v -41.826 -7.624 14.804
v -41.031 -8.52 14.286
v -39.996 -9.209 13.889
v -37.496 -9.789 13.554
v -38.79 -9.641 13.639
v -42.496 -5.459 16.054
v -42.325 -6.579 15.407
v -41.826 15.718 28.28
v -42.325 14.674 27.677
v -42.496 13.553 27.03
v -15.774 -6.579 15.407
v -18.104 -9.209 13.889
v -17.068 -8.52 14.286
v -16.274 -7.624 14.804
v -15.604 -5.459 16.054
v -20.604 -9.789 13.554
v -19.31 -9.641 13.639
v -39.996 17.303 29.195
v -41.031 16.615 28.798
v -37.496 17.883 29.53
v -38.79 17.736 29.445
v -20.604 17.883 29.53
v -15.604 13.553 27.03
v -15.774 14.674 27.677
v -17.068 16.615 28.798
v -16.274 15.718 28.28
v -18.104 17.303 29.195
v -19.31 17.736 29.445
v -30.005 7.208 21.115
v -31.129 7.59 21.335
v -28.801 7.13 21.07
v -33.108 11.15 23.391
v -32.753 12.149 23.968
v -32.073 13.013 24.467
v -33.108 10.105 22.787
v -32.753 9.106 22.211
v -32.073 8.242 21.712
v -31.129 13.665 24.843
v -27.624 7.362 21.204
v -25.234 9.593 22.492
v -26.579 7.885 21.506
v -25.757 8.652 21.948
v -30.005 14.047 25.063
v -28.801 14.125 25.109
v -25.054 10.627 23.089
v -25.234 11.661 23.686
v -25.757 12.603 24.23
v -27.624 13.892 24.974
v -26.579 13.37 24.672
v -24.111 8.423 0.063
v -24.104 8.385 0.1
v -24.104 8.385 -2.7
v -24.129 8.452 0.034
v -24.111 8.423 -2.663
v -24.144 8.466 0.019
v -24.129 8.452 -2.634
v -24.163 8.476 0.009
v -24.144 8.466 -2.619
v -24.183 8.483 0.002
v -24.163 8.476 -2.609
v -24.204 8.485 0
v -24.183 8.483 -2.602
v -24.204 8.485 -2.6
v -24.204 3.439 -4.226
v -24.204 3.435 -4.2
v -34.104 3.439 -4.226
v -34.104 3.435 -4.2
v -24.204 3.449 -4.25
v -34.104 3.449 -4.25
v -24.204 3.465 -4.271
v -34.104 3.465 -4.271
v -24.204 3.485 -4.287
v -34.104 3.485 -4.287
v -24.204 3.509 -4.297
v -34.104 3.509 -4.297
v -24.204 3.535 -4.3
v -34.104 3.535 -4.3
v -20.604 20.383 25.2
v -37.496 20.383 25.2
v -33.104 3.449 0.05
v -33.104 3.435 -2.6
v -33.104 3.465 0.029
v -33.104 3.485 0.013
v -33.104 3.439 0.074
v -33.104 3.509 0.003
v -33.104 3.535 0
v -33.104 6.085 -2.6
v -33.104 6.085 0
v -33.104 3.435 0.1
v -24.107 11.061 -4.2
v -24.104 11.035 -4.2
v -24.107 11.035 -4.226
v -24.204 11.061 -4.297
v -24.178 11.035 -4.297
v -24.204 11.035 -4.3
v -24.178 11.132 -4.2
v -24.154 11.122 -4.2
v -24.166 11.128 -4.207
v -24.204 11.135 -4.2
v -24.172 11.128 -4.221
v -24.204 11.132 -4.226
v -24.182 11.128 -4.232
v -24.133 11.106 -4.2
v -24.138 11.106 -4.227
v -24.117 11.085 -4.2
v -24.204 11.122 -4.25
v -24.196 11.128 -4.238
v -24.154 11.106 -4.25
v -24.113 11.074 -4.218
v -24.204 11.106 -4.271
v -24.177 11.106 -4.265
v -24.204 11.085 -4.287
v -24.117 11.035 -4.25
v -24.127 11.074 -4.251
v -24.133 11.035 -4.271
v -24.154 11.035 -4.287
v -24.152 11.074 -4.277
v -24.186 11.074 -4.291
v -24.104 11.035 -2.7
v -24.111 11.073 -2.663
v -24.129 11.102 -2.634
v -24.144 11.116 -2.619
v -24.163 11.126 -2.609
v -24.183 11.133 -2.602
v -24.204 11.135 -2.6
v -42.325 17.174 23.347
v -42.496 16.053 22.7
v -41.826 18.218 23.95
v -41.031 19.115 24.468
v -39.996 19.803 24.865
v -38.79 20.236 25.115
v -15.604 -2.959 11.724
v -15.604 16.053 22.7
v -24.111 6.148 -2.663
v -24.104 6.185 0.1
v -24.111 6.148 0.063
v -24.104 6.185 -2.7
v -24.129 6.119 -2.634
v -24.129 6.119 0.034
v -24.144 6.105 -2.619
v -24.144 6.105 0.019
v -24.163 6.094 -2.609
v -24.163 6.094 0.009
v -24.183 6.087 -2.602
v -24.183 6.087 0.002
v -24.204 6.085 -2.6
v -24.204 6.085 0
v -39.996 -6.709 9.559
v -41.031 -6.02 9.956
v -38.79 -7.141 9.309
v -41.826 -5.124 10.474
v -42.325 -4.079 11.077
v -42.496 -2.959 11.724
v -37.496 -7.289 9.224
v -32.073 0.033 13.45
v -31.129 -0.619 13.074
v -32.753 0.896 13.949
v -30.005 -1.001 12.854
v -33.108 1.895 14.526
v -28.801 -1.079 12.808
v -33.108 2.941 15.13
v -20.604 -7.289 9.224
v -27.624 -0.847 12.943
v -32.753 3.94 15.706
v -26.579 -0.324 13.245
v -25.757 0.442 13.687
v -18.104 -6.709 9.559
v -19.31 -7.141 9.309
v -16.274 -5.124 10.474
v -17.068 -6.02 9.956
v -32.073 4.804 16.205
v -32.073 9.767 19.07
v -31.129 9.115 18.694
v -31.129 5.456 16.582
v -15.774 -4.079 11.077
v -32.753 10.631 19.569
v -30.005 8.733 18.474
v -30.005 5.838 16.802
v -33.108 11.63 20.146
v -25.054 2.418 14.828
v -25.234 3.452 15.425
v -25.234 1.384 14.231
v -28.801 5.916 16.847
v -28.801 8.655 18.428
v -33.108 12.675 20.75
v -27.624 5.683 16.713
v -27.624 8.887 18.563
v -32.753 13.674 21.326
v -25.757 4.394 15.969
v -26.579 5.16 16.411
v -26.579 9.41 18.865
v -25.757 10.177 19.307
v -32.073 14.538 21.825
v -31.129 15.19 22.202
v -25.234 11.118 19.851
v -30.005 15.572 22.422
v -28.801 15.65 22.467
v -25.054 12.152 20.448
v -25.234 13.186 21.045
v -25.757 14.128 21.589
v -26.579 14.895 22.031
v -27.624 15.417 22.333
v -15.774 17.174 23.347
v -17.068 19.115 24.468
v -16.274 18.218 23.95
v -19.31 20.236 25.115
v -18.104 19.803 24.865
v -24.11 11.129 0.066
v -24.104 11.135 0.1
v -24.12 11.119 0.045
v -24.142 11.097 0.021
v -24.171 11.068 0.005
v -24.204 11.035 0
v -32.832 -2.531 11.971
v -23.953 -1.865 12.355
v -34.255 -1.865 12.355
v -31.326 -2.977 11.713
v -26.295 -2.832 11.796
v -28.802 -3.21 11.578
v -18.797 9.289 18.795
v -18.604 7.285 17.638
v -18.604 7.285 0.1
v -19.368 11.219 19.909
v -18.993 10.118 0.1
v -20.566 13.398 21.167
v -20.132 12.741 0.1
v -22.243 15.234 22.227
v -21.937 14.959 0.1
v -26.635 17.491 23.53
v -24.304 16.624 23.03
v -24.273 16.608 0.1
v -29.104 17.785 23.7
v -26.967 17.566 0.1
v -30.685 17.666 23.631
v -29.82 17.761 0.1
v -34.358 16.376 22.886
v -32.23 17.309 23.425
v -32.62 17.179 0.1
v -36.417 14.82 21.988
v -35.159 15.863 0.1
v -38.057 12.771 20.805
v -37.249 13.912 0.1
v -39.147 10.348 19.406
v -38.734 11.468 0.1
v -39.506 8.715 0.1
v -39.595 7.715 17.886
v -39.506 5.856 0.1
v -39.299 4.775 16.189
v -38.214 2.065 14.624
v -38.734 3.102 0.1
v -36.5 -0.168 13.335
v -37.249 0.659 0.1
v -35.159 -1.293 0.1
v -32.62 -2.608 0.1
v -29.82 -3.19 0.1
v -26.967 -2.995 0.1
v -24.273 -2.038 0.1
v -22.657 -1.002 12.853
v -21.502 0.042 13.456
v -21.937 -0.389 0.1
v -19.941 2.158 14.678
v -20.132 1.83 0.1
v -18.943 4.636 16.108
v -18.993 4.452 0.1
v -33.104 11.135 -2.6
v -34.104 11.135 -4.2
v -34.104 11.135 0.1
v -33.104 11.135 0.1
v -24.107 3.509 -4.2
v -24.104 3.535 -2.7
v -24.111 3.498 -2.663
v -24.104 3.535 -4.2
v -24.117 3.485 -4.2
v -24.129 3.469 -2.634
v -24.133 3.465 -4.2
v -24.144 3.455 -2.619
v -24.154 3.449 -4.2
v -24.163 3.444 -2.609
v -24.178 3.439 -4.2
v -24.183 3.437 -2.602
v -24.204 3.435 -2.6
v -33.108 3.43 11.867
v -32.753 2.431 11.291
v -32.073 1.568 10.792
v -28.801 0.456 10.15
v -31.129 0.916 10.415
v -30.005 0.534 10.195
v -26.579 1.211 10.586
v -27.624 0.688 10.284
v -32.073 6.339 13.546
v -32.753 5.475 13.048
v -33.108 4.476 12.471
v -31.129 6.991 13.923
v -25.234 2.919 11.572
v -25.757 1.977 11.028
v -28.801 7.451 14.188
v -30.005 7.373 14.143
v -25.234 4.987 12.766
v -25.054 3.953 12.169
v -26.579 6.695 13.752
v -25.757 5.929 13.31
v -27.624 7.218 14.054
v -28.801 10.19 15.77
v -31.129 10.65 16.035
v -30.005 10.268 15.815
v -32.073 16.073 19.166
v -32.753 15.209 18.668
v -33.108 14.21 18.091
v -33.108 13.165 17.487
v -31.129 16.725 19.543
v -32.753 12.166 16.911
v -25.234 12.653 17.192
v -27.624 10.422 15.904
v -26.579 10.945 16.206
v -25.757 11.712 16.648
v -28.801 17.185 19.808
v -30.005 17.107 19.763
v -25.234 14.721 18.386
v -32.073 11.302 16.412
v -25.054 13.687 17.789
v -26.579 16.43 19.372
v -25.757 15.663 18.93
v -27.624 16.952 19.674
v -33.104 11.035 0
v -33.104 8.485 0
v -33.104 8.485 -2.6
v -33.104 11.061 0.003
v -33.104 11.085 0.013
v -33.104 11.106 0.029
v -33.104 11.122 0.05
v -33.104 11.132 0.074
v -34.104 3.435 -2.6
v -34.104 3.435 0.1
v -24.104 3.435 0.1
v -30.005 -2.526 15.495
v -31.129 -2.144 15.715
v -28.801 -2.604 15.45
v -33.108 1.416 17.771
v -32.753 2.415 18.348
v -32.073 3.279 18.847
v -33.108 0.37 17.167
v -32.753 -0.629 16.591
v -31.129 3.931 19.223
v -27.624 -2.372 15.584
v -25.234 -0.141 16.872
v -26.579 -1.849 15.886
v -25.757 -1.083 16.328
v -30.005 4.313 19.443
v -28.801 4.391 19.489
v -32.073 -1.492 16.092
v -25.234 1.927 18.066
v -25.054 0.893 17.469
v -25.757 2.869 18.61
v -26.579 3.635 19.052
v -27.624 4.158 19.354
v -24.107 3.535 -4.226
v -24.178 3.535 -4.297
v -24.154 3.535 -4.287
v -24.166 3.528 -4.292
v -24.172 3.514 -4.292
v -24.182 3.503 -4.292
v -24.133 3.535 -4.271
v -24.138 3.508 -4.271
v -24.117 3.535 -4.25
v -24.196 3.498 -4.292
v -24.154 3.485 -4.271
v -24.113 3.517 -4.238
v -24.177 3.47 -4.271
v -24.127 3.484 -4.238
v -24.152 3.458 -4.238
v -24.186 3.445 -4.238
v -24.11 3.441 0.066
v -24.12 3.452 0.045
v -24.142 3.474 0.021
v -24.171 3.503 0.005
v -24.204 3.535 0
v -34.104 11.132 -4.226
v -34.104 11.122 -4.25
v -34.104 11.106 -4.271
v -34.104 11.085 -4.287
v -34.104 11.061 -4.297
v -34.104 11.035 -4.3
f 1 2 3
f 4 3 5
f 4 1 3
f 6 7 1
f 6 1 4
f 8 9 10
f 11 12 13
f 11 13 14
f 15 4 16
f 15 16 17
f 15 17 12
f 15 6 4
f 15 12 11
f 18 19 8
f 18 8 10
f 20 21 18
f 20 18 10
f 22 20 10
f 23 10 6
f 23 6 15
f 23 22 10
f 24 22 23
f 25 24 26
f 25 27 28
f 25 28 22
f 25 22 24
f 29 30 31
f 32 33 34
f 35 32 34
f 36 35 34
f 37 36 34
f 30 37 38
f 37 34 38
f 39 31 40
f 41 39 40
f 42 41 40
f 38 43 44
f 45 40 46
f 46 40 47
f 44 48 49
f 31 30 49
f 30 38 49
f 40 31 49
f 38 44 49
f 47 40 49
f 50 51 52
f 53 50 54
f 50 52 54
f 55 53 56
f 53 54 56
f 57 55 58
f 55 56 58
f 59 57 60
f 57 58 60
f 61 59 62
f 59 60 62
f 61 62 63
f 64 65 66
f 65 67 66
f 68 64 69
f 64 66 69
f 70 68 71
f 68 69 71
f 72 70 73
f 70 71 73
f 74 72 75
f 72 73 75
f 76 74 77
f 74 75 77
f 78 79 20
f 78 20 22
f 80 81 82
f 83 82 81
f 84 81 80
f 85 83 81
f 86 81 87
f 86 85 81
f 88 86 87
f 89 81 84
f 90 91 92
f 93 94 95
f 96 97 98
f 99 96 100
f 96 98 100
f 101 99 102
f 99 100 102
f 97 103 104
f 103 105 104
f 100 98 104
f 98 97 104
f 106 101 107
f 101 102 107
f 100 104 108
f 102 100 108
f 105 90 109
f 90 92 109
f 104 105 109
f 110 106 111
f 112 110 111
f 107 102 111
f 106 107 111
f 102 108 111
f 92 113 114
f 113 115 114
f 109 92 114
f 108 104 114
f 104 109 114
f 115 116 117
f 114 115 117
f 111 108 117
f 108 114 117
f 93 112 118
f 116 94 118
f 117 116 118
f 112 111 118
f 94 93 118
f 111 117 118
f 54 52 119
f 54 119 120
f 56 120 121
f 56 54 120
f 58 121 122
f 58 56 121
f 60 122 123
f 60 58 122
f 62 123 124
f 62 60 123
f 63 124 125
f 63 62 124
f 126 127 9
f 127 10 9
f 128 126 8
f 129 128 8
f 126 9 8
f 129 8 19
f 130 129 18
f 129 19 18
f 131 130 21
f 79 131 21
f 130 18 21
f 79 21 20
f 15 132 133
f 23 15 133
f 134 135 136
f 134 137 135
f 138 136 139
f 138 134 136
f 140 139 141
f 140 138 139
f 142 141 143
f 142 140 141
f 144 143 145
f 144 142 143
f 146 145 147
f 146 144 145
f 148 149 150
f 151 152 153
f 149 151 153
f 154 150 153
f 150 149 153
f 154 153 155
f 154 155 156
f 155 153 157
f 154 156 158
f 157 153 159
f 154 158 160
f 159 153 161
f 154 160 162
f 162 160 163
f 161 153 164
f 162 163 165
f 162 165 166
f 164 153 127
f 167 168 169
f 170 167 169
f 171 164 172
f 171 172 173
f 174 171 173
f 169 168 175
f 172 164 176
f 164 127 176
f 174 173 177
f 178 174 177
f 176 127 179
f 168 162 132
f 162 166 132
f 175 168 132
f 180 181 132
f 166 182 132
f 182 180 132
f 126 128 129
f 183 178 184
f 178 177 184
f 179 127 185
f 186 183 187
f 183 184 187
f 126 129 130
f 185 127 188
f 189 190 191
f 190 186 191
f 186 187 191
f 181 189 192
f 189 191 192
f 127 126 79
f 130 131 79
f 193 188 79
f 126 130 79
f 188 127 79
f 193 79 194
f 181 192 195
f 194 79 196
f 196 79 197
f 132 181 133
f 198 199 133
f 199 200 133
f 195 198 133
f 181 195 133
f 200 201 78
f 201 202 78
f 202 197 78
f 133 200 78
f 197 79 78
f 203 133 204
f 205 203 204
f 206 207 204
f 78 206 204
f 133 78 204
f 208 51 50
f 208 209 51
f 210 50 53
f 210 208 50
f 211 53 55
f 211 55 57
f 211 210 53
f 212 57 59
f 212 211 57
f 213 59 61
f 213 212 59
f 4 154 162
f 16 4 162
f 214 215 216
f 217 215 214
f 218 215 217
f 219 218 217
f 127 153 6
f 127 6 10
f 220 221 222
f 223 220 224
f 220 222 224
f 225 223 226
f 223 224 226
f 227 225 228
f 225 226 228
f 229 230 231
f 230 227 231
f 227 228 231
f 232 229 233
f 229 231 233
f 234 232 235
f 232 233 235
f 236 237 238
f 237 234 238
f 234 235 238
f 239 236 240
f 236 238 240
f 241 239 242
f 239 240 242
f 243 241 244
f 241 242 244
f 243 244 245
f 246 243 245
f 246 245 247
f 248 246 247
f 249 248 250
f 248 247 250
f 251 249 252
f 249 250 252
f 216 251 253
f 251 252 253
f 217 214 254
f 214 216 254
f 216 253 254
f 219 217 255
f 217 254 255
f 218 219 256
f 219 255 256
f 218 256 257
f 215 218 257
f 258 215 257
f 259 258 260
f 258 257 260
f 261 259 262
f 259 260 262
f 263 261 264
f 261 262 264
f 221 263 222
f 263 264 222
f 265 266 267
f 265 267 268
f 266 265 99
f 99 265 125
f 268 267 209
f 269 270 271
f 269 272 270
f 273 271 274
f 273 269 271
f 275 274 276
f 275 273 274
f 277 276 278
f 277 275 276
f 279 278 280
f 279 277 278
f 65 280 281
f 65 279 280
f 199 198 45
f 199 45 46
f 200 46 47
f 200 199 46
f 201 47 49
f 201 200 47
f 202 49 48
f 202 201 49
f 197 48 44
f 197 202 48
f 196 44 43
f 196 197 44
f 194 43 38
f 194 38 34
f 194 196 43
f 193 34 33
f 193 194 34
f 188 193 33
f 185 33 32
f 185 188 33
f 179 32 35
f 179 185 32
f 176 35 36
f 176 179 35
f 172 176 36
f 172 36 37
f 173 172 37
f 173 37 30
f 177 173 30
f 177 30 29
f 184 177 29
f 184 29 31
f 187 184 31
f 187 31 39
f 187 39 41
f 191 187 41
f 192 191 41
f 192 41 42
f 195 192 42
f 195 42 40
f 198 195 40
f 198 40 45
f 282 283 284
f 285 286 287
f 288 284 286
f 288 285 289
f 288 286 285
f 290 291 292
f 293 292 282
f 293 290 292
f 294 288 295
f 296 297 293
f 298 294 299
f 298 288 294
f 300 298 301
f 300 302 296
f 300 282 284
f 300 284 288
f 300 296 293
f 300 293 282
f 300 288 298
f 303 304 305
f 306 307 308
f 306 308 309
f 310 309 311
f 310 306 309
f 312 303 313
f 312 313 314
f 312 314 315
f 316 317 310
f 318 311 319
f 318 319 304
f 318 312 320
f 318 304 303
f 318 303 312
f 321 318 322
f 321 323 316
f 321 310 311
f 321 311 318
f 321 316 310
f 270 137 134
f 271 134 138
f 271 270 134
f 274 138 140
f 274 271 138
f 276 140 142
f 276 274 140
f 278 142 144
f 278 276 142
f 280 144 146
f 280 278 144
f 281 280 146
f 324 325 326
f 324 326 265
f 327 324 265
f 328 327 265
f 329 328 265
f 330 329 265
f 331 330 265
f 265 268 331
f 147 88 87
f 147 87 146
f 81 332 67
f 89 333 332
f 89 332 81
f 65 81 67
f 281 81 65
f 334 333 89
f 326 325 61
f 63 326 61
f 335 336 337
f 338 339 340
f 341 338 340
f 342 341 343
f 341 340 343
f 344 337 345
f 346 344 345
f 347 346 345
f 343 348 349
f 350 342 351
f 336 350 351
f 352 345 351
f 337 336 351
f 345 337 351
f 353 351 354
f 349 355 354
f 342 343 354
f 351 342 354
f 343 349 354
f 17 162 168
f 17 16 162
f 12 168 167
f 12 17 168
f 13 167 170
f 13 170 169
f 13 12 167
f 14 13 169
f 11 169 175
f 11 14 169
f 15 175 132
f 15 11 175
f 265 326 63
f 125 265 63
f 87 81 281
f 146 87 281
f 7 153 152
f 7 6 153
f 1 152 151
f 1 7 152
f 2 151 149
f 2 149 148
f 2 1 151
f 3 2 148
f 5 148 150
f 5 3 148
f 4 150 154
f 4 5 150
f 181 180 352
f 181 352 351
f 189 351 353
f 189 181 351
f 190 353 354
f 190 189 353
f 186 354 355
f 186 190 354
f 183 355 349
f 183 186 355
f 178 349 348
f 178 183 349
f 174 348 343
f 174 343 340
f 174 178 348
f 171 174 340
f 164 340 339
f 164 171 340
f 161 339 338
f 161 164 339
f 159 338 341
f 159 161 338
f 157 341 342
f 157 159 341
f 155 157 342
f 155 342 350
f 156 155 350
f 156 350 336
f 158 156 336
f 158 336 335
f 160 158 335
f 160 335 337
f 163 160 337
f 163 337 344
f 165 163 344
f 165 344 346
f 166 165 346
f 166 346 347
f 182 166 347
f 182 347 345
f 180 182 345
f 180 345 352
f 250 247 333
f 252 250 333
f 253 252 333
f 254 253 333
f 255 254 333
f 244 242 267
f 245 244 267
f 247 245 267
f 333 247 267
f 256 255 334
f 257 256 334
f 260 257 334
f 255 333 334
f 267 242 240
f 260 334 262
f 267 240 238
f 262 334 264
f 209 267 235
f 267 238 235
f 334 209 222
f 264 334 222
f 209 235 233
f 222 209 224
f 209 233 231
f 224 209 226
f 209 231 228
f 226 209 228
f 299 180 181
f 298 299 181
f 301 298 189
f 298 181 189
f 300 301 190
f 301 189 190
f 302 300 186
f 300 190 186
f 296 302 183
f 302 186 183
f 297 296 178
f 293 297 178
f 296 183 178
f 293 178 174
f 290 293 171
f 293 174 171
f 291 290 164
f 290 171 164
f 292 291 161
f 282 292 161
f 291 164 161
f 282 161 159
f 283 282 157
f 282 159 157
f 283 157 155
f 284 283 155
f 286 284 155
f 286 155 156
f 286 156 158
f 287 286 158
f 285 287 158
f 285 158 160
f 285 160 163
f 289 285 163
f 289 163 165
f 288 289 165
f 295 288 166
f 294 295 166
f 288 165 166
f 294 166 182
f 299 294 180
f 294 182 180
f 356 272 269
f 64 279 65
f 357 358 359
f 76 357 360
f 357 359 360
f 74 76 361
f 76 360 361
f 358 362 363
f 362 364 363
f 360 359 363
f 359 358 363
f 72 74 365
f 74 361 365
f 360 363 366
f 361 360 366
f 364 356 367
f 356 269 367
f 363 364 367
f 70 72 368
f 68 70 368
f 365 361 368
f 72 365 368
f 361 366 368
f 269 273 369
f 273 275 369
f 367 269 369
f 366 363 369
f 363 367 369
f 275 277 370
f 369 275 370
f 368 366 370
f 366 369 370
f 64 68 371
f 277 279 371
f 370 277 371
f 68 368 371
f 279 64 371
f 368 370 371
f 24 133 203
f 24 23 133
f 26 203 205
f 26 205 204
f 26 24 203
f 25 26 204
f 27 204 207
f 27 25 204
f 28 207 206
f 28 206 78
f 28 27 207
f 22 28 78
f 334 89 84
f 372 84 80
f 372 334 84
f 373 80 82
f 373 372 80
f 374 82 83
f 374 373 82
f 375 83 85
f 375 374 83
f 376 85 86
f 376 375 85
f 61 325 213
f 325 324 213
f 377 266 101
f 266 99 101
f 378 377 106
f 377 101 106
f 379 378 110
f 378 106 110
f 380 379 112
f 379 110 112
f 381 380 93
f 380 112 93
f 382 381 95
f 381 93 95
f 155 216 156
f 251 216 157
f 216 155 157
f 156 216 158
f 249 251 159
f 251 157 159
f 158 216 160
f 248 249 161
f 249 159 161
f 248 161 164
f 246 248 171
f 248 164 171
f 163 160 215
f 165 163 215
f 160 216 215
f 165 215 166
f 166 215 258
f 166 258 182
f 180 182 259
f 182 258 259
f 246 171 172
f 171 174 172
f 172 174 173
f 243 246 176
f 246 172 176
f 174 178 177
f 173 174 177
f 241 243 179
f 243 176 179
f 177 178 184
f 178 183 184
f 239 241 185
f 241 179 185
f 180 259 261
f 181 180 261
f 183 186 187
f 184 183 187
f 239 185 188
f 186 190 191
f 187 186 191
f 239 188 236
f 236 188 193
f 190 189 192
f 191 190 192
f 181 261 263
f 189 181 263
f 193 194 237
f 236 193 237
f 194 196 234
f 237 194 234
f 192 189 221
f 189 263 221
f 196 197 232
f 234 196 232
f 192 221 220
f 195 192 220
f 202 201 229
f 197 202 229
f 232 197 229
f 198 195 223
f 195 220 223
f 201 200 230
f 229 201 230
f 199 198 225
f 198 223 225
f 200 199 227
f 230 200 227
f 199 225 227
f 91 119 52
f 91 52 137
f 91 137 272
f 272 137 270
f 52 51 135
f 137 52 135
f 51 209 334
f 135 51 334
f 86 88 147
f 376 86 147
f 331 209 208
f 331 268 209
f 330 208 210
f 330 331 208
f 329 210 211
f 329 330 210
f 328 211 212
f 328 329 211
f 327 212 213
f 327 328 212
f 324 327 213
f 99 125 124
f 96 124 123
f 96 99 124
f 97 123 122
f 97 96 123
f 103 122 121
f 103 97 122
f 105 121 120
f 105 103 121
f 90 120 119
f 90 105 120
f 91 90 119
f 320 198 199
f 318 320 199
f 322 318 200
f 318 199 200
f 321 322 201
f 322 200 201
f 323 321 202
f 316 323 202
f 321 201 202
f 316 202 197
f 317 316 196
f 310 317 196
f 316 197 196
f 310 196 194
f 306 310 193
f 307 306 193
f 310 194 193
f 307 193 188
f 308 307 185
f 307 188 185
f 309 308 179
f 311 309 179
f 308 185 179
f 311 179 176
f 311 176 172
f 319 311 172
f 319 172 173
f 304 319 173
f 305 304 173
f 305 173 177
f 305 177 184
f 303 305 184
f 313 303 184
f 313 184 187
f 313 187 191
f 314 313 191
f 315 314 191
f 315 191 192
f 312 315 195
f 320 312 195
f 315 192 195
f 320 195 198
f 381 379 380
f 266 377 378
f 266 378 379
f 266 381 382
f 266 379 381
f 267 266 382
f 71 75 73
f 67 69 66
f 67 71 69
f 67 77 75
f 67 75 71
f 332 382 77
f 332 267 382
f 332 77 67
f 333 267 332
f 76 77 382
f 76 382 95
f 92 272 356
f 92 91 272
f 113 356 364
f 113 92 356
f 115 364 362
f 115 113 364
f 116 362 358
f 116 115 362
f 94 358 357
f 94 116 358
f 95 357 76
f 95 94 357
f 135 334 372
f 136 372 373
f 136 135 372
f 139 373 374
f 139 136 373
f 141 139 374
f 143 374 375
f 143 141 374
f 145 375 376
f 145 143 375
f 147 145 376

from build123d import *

# Parameters (mm, degrees)
F0_W           = 1
F0_H           = 2.65
F0_H_2         = 2.4
F0_W_2         = 9
F1_DEPTH       = 1.7
F2_DEPTH       = 4.3
F3_START       = 2.6
F3_DEPTH       = 1.7
F4_DEPTH       = 2.6
F5_START       = 0.1
F0_R           = 10.5
F5_DEPTH       = 1.6
F6_R           = 0.09999
F7_R           = 10.5
F8_DEPTH       = 22
F10_DEPTH      = 39.6047188237
F10_DEPTH_BACK = 25
F11_R          = 4.05
F12_DEPTH      = 3.07
F13_W          = 26.8920833189
F13_H          = 31.9528504953
F14_DEPTH      = 5
F13_R          = 4.05
F15_DEPTH      = 3.05
F16_START      = 3.05
F16_DEPTH      = 1.95
F17_R          = 5


# Not quite as in the source:
# - a fillet or chamfer is up to 0.001 mm smaller than in the source, because OpenCascade refuses the exact size


with BuildPart() as f1:
    # F0 (on Top) → F1 (new body)
    with BuildSketch(Plane.XY):
        with Locations((-33.6037188237, 9.8102559388)):
            Rectangle(F0_W, F0_H)
        with Locations((-33.6037188237, 7.2852559388)):
            Rectangle(F0_W, F0_H_2)
        with Locations((-28.6037188237, 9.8102559388)):
            Rectangle(F0_W_2, F0_H)
        with Locations((-28.6037188237, 7.2852559388)):
            Rectangle(F0_W_2, F0_H_2)
        with Locations((-28.6037188237, 4.7602559388)):
            Rectangle(F0_W_2, F0_H)
        with Locations((-33.6037188237, 4.7602559388)):
            Rectangle(F0_W, F0_H)
    extrude(amount=F1_DEPTH)

    # F0 (on Top) → F2 (join)
    with BuildSketch(Plane.XY):
        with Locations((-28.6037188237, 7.2852559388)):
            Rectangle(F0_W_2, F0_H_2)
    extrude(amount=-F2_DEPTH)

    # F1_face (on face) → F3 (join)
    with BuildSketch(Plane(origin=(-29.298664672, 7.2852559388, 0), x_dir=(1, 0, 0), z_dir=(0, 0, -1)).offset(F3_START)):
        Polygon((-4.8050541516, -3.85), (5.1949458484, -3.85), (5.1949458484, -1.2), (-3.8050541516, -1.2), (-3.8050541516, 1.2), (5.1949458484, 1.2), (5.1949458484, 3.85), (-4.8050541516, 3.85), align=None)
    extrude(amount=F3_DEPTH)

    # F0 (on Top) → F4 (join, through all)
    with BuildSketch(Plane.XY):
        with Locations((-33.6037188237, 9.8102559388)):
            Rectangle(F0_W, F0_H)
        with Locations((-33.6037188237, 7.2852559388)):
            Rectangle(F0_W, F0_H_2)
        with Locations((-33.6037188237, 4.7602559388)):
            Rectangle(F0_W, F0_H)
    extrude(amount=-F4_DEPTH)

    # F0 (on Top) → F5 (join)
    with BuildSketch(Plane.XY.offset(F5_START)):
        with Locations((-29.1037188237, 7.2852559388)):
            Circle(F0_R)
        Polygon((-34.1037188237, 8.4852559388), (-34.1037188237, 11.1352559388), (-33.1037188237, 11.1352559388), (-24.1037188237, 11.1352559388), (-24.1037188237, 8.4852559388), (-24.1037188237, 6.0852559388), (-24.1037188237, 3.4352559388), (-33.1037188237, 3.4352559388), (-34.1037188237, 3.4352559388), (-34.1037188237, 6.0852559388), align=None, mode=Mode.SUBTRACT)
    extrude(amount=F5_DEPTH)

    # F6 (radius 0.1 in the source; OpenCascade refuses exactly that, so slightly less here)
    f6_edges = [f1.edges().sort_by_distance(p)[0] for p in [
        (-24.103719, 4.760256, 0),
        (-24.103719, 9.810256, 0),
        (-24.103719, 6.085256, -1.3),
        (-24.103719, 8.485256, -1.3),
        (-24.103719, 9.810256, -2.6),
        (-24.103719, 4.760256, -2.6),
        (-24.103719, 3.435256, -3.45),
        (-24.103719, 7.285256, -4.3),
        (-24.103719, 11.135256, -3.45),
        (-28.603719, 3.435256, 0),
        (-28.603719, 11.135256, 0),
        (-29.103719, 3.435256, -4.3),
        (-29.103719, 11.135256, -4.3),
    ]]
    fillet(f6_edges, radius=F6_R)

    # F7 (on face) → F8 (join)
    with BuildSketch(Plane.XY.offset(1.7)):
        with Locations((-29.1037188237, 7.2852559388)):
            Circle(F7_R)
    extrude(amount=F8_DEPTH)

    # F9 (on Right) → F10 (cut, two sides)
    with BuildSketch(Plane.YZ) as f10_sk:
        Polygon((17.7852559388, 23.7), (-3.2147440612, 23.7), (-7.2555868058, 9.2426627007), (-1.8645326524, 12.3551892673), align=None)
    extrude(amount=-F10_DEPTH, mode=Mode.SUBTRACT)
    extrude(f10_sk.sketch, amount=F10_DEPTH_BACK, mode=Mode.SUBTRACT)

    # F11 (on face) → F12 (cut)
    with BuildSketch(Plane(origin=(0, -5.8160870502, 10.0737582721), x_dir=(1, 0, 0), z_dir=(0, -0.5, 0.8660254038))):
        with Locations((-29.1037188237, 9.5081278028)):
            Circle(F11_R)
        with Locations((-29.1037188237, 20.7481278028)):
            Circle(F11_R)
    extrude(amount=-F12_DEPTH, mode=Mode.SUBTRACT)


with BuildPart() as f14:
    # F13 (on face) → F14 (new body)
    with BuildSketch(Plane(origin=(0, -5.8160870502, 10.0737582721), x_dir=(1, 0, 0), z_dir=(0, -0.5, 0.8660254038))):
        with Locations((-29.0497604831, 14.2760582082)):
            Rectangle(F13_W, F13_H)
        with BuildLine():
            Line((-18.6037188237, 1.2996329605), (-39.4958021426, 1.2996329605))
            Line((-39.4958021426, 1.2996329605), (-39.4958021426, 13.2724569986))
            add(Edge.make_bspline(
                [(-39.6037188237, 15.1281280197), (-39.6037188363, 14.1954998359), (-39.4958021426, 13.2724569986)],
                knots=[4.7123889637, 4.7123889637, 4.7123889637, 4.8674305263, 4.8674305263, 4.8674305263], degree=2, weights=[1, 0.9710906997, 0.9478882411]))
            add(Edge.make_bspline(
                [(-39.4958021426, 16.983798607), (-39.603718811, 16.0607559855), (-39.6037188237, 15.1281280197)],
                knots=[4.5573474366, 4.5573474366, 4.5573474366, 4.7123889637, 4.7123889637, 4.7123889637], degree=2, weights=[0.9478882526, 0.9710907067, 1]))
            Line((-39.4958021426, 16.983798607), (-39.4958021426, 27.2524834558))
            Line((-39.4958021426, 27.2524834558), (-32.8458187492, 27.2524834558))
            add(Edge.make_bspline(
                [(-25.3616188981, 27.2524834558), (-27.1691542693, 28.1045530304), (-29.1037187359, 28.1045530504), (-31.0382832932, 28.1045530704), (-32.8458187492, 27.2524834558)],
                knots=[2.7613255041, 2.7613255041, 2.7613255041, 3.1415926452, 3.1415926452, 3.521859803, 3.521859803, 3.521859803], degree=2, weights=[0.8925198158, 0.9290947753, 1, 0.9290947722, 0.8925198127]))
            Line((-25.3616188981, 27.2524834558), (-18.6037188237, 27.2524834558))
            Line((-18.6037188237, 27.2524834558), (-18.6037188237, 15.1281278028))
            Line((-18.6037188237, 15.1281278028), (-18.6037188237, 1.2996329605))
        make_face(mode=Mode.SUBTRACT)
        with BuildLine():
            Line((-39.4958021426, 13.2724569986), (-39.4958021426, 1.2996329605))
            Line((-39.4958021426, 1.2996329605), (-18.6037188237, 1.2996329605))
            Line((-18.6037188237, 1.2996329605), (-18.6037188237, 15.1281278028))
            add(Edge.make_bspline(
                [(-29.1037188237, 2.1517025552), (-18.6037188237, 2.1517025552), (-18.6037188237, 15.1281278028)],
                knots=[0, 0, 0, 1.5707963268, 1.5707963268, 1.5707963268], degree=2, weights=[1, 0.7071067812, 1]))
            add(Edge.make_bspline(
                [(-39.4958021426, 13.2724569986), (-38.1956294939, 2.1517025552), (-29.1037188237, 2.1517025552)],
                knots=[4.8674305263, 4.8674305263, 4.8674305263, 6.2831853072, 6.2831853072, 6.2831853072], degree=2, weights=[0.9478882411, 0.7360160756, 1]))
        make_face()
        with BuildLine():
            add(Edge.make_bspline(
                [(-18.6037188237, 15.1281278028), (-18.6037188237, 24.0668190788), (-25.3616188981, 27.2524834558)],
                knots=[1.5707963268, 1.5707963268, 1.5707963268, 2.7613255041, 2.7613255041, 2.7613255041], degree=2, weights=[1, 0.7780120088, 0.8925198158]))
            Line((-18.6037188237, 15.1281278028), (-18.6037188237, 27.2524834558))
            Line((-18.6037188237, 27.2524834558), (-25.3616188981, 27.2524834558))
        make_face()
        with BuildLine():
            Line((-39.4958021426, 27.2524834558), (-39.4958021426, 16.983798607))
            add(Edge.make_bspline(
                [(-32.8458187492, 27.2524834558), (-38.6131013788, 24.5337947178), (-39.4958021426, 16.983798607)],
                knots=[3.521859803, 3.521859803, 3.521859803, 4.5573474366, 4.5573474366, 4.5573474366], degree=2, weights=[0.8925198127, 0.7929242584, 0.9478882526]))
            Line((-32.8458187492, 27.2524834558), (-39.4958021426, 27.2524834558))
        make_face()
    extrude(amount=F14_DEPTH)

    # F13 (on face) → F14, piece 2 (join)
    with BuildSketch(Plane(origin=(0, -5.8160870502, 10.0737582721), x_dir=(1, 0, 0), z_dir=(0, -0.5, 0.8660254038))):
        with BuildLine():
            add(Edge.make_bspline(
                [(-18.6037188237, 15.1281278028), (-18.6037188237, -14.1426560497), (-36.5283400261, 6.5549137031), (-38.9966235925, 9.4050420661), (-39.4958021426, 13.394305708)],
                knots=[4.7123889804, 4.7123889804, 4.7123889804, 7.0685834706, 7.0685834706, 7.7623255267, 7.7623255267, 7.7623255267], degree=2, weights=[1, 0.3826834324, 1, 0.8182414624, 0.7435144471]))
            add(Edge.make_bspline(
                [(-29.1037188237, 27.2524834558), (-18.6037188237, 27.2524834558), (-18.6037188237, 15.1281278028)],
                knots=[3.1415926536, 3.1415926536, 3.1415926536, 4.7123889804, 4.7123889804, 4.7123889804], degree=2, weights=[1, 0.7071067812, 1]))
            add(Edge.make_bspline(
                [(-39.4958021426, 16.8619498976), (-38.1956294939, 27.2524834558), (-29.1037188237, 27.2524834558)],
                knots=[8.0258450855, 8.0258450855, 8.0258450855, 9.4247779608, 9.4247779608, 9.4247779608], degree=2, weights=[0.7021873252, 0.6334833799, 1]))
            Line((-39.4958021426, 16.8619498976), (-39.4958021426, 13.394305708))
        make_face()
        with Locations((-29.1037188237, 9.5081278028)):
            Circle(F13_R, mode=Mode.SUBTRACT)
        with Locations((-29.1037188237, 20.7481278028)):
            Circle(F13_R, mode=Mode.SUBTRACT)
        with BuildLine():
            add(Edge.make_bspline(
                [(-39.4958021426, 13.394305708), (-39.6037188372, 14.2567388914), (-39.6037188237, 15.1281280197)],
                knots=[7.7623255267, 7.7623255267, 7.7623255267, 7.8959689632, 7.8959689632, 7.8959689632], degree=2, weights=[0.7435144471, 0.7291189307, 0.7186954298]))
            Line((-39.4958021426, 13.394305708), (-39.4958021426, 16.8619498976))
            add(Edge.make_bspline(
                [(-39.6037188237, 15.1281280197), (-39.6037188102, 15.99951693), (-39.4958021426, 16.8619498976)],
                knots=[7.8959689632, 7.8959689632, 7.8959689632, 8.0258450855, 8.0258450855, 8.0258450855], degree=2, weights=[0.7186954298, 0.70856576, 0.7021873252]))
        make_face()
    extrude(amount=F14_DEPTH)

    # F11 (on face) → F15 (join)
    with BuildSketch(Plane(origin=(0, -5.8160870502, 10.0737582721), x_dir=(1, 0, 0), z_dir=(0, -0.5, 0.8660254038))):
        with BuildLine():
            add(Edge.make_bspline(
                [(-29.1037188237, 27.2524834558), (-18.6037188237, 27.2524834558), (-18.6037188237, 15.1281278028)],
                knots=[3.1415926536, 3.1415926536, 3.1415926536, 4.7123889804, 4.7123889804, 4.7123889804], degree=2, weights=[1, 0.7071067812, 1]))
            add(Edge.make_bspline(
                [(-18.6037188237, 15.1281278028), (-18.6037188237, 28.104552942), (-29.1037187359, 28.1045530504), (-39.6037186481, 28.1045531589), (-39.6037188237, 15.1281280197)],
                knots=[1.5707963268, 1.5707963268, 1.5707963268, 3.1415926452, 3.1415926452, 4.7123889637, 4.7123889637, 4.7123889637], degree=2, weights=[1, 0.7071067841, 1, 0.7071067841, 1]))
            add(Edge.make_bspline(
                [(-39.6037188237, 15.1281280197), (-39.6037186358, 27.2524834558), (-29.1037188237, 27.2524834558)],
                knots=[7.8959689632, 7.8959689632, 7.8959689632, 9.4247779608, 9.4247779608, 9.4247779608], degree=2, weights=[0.7186954298, 0.599456188, 1]))
        make_face()
        with BuildLine():
            add(Edge.make_bspline(
                [(-39.6037188237, 15.1281280197), (-39.6037189992, 2.1517025552), (-29.1037188237, 2.1517025552)],
                knots=[4.7123889637, 4.7123889637, 4.7123889637, 6.2831853072, 6.2831853072, 6.2831853072], degree=2, weights=[1, 0.7071067753, 1]))
            add(Edge.make_bspline(
                [(-29.1037188237, 2.1517025552), (-18.6037188237, 2.1517025552), (-18.6037188237, 15.1281278028)],
                knots=[0, 0, 0, 1.5707963268, 1.5707963268, 1.5707963268], degree=2, weights=[1, 0.7071067812, 1]))
            add(Edge.make_bspline(
                [(-18.6037188237, 15.1281278028), (-18.6037188237, -14.1426560497), (-36.5283400261, 6.5549137031), (-39.6037189015, 10.1060553462), (-39.6037188237, 15.1281280197)],
                knots=[4.7123889804, 4.7123889804, 4.7123889804, 7.0685834706, 7.0685834706, 7.8959689632, 7.8959689632, 7.8959689632], degree=2, weights=[1, 0.3826834324, 1, 0.7832272444, 0.7186954298]))
        make_face()
    extrude(amount=F15_DEPTH)

    # F11 (on face) → F16 (join)
    with BuildSketch(Plane(origin=(0, -5.8160870502, 10.0737582721), x_dir=(1, 0, 0), z_dir=(0, -0.5, 0.8660254038)).offset(F16_START)):
        with Locations((-29.1037188237, 20.7481278028)):
            Circle(F11_R)
        with Locations((-29.1037188237, 9.5081278028)):
            Circle(F11_R)
        with BuildLine():
            add(Edge.make_bspline(
                [(-29.1037188237, 27.2524834558), (-18.6037188237, 27.2524834558), (-18.6037188237, 15.1281278028)],
                knots=[3.1415926536, 3.1415926536, 3.1415926536, 4.7123889804, 4.7123889804, 4.7123889804], degree=2, weights=[1, 0.7071067812, 1]))
            add(Edge.make_bspline(
                [(-18.6037188237, 15.1281278028), (-18.6037188237, 28.104552942), (-29.1037187359, 28.1045530504), (-39.6037186481, 28.1045531589), (-39.6037188237, 15.1281280197)],
                knots=[1.5707963268, 1.5707963268, 1.5707963268, 3.1415926452, 3.1415926452, 4.7123889637, 4.7123889637, 4.7123889637], degree=2, weights=[1, 0.7071067841, 1, 0.7071067841, 1]))
            add(Edge.make_bspline(
                [(-39.6037188237, 15.1281280197), (-39.6037186358, 27.2524834558), (-29.1037188237, 27.2524834558)],
                knots=[7.8959689632, 7.8959689632, 7.8959689632, 9.4247779608, 9.4247779608, 9.4247779608], degree=2, weights=[0.7186954298, 0.599456188, 1]))
        make_face()
        with BuildLine():
            add(Edge.make_bspline(
                [(-39.6037188237, 15.1281280197), (-39.6037189992, 2.1517025552), (-29.1037188237, 2.1517025552)],
                knots=[4.7123889637, 4.7123889637, 4.7123889637, 6.2831853072, 6.2831853072, 6.2831853072], degree=2, weights=[1, 0.7071067753, 1]))
            add(Edge.make_bspline(
                [(-29.1037188237, 2.1517025552), (-18.6037188237, 2.1517025552), (-18.6037188237, 15.1281278028)],
                knots=[0, 0, 0, 1.5707963268, 1.5707963268, 1.5707963268], degree=2, weights=[1, 0.7071067812, 1]))
            add(Edge.make_bspline(
                [(-18.6037188237, 15.1281278028), (-18.6037188237, -14.1426560497), (-36.5283400261, 6.5549137031), (-39.6037189015, 10.1060553462), (-39.6037188237, 15.1281280197)],
                knots=[4.7123889804, 4.7123889804, 4.7123889804, 7.0685834706, 7.0685834706, 7.8959689632, 7.8959689632, 7.8959689632], degree=2, weights=[1, 0.3826834324, 1, 0.7832272444, 0.7186954298]))
        make_face()
    extrude(amount=F16_DEPTH)

    # F17
    f17_edges = [f14.edges().sort_by_distance(p)[0] for p in [
        (-42.495802, -8.538648, 11.388638),
        (-42.495802, 19.133332, 27.365064),
        (-15.603719, 19.133332, 27.365064),
        (-15.603719, -8.538648, 11.388638),
    ]]
    fillet(f17_edges, radius=F17_R)


solid = Compound([f1.part, f14.part])
